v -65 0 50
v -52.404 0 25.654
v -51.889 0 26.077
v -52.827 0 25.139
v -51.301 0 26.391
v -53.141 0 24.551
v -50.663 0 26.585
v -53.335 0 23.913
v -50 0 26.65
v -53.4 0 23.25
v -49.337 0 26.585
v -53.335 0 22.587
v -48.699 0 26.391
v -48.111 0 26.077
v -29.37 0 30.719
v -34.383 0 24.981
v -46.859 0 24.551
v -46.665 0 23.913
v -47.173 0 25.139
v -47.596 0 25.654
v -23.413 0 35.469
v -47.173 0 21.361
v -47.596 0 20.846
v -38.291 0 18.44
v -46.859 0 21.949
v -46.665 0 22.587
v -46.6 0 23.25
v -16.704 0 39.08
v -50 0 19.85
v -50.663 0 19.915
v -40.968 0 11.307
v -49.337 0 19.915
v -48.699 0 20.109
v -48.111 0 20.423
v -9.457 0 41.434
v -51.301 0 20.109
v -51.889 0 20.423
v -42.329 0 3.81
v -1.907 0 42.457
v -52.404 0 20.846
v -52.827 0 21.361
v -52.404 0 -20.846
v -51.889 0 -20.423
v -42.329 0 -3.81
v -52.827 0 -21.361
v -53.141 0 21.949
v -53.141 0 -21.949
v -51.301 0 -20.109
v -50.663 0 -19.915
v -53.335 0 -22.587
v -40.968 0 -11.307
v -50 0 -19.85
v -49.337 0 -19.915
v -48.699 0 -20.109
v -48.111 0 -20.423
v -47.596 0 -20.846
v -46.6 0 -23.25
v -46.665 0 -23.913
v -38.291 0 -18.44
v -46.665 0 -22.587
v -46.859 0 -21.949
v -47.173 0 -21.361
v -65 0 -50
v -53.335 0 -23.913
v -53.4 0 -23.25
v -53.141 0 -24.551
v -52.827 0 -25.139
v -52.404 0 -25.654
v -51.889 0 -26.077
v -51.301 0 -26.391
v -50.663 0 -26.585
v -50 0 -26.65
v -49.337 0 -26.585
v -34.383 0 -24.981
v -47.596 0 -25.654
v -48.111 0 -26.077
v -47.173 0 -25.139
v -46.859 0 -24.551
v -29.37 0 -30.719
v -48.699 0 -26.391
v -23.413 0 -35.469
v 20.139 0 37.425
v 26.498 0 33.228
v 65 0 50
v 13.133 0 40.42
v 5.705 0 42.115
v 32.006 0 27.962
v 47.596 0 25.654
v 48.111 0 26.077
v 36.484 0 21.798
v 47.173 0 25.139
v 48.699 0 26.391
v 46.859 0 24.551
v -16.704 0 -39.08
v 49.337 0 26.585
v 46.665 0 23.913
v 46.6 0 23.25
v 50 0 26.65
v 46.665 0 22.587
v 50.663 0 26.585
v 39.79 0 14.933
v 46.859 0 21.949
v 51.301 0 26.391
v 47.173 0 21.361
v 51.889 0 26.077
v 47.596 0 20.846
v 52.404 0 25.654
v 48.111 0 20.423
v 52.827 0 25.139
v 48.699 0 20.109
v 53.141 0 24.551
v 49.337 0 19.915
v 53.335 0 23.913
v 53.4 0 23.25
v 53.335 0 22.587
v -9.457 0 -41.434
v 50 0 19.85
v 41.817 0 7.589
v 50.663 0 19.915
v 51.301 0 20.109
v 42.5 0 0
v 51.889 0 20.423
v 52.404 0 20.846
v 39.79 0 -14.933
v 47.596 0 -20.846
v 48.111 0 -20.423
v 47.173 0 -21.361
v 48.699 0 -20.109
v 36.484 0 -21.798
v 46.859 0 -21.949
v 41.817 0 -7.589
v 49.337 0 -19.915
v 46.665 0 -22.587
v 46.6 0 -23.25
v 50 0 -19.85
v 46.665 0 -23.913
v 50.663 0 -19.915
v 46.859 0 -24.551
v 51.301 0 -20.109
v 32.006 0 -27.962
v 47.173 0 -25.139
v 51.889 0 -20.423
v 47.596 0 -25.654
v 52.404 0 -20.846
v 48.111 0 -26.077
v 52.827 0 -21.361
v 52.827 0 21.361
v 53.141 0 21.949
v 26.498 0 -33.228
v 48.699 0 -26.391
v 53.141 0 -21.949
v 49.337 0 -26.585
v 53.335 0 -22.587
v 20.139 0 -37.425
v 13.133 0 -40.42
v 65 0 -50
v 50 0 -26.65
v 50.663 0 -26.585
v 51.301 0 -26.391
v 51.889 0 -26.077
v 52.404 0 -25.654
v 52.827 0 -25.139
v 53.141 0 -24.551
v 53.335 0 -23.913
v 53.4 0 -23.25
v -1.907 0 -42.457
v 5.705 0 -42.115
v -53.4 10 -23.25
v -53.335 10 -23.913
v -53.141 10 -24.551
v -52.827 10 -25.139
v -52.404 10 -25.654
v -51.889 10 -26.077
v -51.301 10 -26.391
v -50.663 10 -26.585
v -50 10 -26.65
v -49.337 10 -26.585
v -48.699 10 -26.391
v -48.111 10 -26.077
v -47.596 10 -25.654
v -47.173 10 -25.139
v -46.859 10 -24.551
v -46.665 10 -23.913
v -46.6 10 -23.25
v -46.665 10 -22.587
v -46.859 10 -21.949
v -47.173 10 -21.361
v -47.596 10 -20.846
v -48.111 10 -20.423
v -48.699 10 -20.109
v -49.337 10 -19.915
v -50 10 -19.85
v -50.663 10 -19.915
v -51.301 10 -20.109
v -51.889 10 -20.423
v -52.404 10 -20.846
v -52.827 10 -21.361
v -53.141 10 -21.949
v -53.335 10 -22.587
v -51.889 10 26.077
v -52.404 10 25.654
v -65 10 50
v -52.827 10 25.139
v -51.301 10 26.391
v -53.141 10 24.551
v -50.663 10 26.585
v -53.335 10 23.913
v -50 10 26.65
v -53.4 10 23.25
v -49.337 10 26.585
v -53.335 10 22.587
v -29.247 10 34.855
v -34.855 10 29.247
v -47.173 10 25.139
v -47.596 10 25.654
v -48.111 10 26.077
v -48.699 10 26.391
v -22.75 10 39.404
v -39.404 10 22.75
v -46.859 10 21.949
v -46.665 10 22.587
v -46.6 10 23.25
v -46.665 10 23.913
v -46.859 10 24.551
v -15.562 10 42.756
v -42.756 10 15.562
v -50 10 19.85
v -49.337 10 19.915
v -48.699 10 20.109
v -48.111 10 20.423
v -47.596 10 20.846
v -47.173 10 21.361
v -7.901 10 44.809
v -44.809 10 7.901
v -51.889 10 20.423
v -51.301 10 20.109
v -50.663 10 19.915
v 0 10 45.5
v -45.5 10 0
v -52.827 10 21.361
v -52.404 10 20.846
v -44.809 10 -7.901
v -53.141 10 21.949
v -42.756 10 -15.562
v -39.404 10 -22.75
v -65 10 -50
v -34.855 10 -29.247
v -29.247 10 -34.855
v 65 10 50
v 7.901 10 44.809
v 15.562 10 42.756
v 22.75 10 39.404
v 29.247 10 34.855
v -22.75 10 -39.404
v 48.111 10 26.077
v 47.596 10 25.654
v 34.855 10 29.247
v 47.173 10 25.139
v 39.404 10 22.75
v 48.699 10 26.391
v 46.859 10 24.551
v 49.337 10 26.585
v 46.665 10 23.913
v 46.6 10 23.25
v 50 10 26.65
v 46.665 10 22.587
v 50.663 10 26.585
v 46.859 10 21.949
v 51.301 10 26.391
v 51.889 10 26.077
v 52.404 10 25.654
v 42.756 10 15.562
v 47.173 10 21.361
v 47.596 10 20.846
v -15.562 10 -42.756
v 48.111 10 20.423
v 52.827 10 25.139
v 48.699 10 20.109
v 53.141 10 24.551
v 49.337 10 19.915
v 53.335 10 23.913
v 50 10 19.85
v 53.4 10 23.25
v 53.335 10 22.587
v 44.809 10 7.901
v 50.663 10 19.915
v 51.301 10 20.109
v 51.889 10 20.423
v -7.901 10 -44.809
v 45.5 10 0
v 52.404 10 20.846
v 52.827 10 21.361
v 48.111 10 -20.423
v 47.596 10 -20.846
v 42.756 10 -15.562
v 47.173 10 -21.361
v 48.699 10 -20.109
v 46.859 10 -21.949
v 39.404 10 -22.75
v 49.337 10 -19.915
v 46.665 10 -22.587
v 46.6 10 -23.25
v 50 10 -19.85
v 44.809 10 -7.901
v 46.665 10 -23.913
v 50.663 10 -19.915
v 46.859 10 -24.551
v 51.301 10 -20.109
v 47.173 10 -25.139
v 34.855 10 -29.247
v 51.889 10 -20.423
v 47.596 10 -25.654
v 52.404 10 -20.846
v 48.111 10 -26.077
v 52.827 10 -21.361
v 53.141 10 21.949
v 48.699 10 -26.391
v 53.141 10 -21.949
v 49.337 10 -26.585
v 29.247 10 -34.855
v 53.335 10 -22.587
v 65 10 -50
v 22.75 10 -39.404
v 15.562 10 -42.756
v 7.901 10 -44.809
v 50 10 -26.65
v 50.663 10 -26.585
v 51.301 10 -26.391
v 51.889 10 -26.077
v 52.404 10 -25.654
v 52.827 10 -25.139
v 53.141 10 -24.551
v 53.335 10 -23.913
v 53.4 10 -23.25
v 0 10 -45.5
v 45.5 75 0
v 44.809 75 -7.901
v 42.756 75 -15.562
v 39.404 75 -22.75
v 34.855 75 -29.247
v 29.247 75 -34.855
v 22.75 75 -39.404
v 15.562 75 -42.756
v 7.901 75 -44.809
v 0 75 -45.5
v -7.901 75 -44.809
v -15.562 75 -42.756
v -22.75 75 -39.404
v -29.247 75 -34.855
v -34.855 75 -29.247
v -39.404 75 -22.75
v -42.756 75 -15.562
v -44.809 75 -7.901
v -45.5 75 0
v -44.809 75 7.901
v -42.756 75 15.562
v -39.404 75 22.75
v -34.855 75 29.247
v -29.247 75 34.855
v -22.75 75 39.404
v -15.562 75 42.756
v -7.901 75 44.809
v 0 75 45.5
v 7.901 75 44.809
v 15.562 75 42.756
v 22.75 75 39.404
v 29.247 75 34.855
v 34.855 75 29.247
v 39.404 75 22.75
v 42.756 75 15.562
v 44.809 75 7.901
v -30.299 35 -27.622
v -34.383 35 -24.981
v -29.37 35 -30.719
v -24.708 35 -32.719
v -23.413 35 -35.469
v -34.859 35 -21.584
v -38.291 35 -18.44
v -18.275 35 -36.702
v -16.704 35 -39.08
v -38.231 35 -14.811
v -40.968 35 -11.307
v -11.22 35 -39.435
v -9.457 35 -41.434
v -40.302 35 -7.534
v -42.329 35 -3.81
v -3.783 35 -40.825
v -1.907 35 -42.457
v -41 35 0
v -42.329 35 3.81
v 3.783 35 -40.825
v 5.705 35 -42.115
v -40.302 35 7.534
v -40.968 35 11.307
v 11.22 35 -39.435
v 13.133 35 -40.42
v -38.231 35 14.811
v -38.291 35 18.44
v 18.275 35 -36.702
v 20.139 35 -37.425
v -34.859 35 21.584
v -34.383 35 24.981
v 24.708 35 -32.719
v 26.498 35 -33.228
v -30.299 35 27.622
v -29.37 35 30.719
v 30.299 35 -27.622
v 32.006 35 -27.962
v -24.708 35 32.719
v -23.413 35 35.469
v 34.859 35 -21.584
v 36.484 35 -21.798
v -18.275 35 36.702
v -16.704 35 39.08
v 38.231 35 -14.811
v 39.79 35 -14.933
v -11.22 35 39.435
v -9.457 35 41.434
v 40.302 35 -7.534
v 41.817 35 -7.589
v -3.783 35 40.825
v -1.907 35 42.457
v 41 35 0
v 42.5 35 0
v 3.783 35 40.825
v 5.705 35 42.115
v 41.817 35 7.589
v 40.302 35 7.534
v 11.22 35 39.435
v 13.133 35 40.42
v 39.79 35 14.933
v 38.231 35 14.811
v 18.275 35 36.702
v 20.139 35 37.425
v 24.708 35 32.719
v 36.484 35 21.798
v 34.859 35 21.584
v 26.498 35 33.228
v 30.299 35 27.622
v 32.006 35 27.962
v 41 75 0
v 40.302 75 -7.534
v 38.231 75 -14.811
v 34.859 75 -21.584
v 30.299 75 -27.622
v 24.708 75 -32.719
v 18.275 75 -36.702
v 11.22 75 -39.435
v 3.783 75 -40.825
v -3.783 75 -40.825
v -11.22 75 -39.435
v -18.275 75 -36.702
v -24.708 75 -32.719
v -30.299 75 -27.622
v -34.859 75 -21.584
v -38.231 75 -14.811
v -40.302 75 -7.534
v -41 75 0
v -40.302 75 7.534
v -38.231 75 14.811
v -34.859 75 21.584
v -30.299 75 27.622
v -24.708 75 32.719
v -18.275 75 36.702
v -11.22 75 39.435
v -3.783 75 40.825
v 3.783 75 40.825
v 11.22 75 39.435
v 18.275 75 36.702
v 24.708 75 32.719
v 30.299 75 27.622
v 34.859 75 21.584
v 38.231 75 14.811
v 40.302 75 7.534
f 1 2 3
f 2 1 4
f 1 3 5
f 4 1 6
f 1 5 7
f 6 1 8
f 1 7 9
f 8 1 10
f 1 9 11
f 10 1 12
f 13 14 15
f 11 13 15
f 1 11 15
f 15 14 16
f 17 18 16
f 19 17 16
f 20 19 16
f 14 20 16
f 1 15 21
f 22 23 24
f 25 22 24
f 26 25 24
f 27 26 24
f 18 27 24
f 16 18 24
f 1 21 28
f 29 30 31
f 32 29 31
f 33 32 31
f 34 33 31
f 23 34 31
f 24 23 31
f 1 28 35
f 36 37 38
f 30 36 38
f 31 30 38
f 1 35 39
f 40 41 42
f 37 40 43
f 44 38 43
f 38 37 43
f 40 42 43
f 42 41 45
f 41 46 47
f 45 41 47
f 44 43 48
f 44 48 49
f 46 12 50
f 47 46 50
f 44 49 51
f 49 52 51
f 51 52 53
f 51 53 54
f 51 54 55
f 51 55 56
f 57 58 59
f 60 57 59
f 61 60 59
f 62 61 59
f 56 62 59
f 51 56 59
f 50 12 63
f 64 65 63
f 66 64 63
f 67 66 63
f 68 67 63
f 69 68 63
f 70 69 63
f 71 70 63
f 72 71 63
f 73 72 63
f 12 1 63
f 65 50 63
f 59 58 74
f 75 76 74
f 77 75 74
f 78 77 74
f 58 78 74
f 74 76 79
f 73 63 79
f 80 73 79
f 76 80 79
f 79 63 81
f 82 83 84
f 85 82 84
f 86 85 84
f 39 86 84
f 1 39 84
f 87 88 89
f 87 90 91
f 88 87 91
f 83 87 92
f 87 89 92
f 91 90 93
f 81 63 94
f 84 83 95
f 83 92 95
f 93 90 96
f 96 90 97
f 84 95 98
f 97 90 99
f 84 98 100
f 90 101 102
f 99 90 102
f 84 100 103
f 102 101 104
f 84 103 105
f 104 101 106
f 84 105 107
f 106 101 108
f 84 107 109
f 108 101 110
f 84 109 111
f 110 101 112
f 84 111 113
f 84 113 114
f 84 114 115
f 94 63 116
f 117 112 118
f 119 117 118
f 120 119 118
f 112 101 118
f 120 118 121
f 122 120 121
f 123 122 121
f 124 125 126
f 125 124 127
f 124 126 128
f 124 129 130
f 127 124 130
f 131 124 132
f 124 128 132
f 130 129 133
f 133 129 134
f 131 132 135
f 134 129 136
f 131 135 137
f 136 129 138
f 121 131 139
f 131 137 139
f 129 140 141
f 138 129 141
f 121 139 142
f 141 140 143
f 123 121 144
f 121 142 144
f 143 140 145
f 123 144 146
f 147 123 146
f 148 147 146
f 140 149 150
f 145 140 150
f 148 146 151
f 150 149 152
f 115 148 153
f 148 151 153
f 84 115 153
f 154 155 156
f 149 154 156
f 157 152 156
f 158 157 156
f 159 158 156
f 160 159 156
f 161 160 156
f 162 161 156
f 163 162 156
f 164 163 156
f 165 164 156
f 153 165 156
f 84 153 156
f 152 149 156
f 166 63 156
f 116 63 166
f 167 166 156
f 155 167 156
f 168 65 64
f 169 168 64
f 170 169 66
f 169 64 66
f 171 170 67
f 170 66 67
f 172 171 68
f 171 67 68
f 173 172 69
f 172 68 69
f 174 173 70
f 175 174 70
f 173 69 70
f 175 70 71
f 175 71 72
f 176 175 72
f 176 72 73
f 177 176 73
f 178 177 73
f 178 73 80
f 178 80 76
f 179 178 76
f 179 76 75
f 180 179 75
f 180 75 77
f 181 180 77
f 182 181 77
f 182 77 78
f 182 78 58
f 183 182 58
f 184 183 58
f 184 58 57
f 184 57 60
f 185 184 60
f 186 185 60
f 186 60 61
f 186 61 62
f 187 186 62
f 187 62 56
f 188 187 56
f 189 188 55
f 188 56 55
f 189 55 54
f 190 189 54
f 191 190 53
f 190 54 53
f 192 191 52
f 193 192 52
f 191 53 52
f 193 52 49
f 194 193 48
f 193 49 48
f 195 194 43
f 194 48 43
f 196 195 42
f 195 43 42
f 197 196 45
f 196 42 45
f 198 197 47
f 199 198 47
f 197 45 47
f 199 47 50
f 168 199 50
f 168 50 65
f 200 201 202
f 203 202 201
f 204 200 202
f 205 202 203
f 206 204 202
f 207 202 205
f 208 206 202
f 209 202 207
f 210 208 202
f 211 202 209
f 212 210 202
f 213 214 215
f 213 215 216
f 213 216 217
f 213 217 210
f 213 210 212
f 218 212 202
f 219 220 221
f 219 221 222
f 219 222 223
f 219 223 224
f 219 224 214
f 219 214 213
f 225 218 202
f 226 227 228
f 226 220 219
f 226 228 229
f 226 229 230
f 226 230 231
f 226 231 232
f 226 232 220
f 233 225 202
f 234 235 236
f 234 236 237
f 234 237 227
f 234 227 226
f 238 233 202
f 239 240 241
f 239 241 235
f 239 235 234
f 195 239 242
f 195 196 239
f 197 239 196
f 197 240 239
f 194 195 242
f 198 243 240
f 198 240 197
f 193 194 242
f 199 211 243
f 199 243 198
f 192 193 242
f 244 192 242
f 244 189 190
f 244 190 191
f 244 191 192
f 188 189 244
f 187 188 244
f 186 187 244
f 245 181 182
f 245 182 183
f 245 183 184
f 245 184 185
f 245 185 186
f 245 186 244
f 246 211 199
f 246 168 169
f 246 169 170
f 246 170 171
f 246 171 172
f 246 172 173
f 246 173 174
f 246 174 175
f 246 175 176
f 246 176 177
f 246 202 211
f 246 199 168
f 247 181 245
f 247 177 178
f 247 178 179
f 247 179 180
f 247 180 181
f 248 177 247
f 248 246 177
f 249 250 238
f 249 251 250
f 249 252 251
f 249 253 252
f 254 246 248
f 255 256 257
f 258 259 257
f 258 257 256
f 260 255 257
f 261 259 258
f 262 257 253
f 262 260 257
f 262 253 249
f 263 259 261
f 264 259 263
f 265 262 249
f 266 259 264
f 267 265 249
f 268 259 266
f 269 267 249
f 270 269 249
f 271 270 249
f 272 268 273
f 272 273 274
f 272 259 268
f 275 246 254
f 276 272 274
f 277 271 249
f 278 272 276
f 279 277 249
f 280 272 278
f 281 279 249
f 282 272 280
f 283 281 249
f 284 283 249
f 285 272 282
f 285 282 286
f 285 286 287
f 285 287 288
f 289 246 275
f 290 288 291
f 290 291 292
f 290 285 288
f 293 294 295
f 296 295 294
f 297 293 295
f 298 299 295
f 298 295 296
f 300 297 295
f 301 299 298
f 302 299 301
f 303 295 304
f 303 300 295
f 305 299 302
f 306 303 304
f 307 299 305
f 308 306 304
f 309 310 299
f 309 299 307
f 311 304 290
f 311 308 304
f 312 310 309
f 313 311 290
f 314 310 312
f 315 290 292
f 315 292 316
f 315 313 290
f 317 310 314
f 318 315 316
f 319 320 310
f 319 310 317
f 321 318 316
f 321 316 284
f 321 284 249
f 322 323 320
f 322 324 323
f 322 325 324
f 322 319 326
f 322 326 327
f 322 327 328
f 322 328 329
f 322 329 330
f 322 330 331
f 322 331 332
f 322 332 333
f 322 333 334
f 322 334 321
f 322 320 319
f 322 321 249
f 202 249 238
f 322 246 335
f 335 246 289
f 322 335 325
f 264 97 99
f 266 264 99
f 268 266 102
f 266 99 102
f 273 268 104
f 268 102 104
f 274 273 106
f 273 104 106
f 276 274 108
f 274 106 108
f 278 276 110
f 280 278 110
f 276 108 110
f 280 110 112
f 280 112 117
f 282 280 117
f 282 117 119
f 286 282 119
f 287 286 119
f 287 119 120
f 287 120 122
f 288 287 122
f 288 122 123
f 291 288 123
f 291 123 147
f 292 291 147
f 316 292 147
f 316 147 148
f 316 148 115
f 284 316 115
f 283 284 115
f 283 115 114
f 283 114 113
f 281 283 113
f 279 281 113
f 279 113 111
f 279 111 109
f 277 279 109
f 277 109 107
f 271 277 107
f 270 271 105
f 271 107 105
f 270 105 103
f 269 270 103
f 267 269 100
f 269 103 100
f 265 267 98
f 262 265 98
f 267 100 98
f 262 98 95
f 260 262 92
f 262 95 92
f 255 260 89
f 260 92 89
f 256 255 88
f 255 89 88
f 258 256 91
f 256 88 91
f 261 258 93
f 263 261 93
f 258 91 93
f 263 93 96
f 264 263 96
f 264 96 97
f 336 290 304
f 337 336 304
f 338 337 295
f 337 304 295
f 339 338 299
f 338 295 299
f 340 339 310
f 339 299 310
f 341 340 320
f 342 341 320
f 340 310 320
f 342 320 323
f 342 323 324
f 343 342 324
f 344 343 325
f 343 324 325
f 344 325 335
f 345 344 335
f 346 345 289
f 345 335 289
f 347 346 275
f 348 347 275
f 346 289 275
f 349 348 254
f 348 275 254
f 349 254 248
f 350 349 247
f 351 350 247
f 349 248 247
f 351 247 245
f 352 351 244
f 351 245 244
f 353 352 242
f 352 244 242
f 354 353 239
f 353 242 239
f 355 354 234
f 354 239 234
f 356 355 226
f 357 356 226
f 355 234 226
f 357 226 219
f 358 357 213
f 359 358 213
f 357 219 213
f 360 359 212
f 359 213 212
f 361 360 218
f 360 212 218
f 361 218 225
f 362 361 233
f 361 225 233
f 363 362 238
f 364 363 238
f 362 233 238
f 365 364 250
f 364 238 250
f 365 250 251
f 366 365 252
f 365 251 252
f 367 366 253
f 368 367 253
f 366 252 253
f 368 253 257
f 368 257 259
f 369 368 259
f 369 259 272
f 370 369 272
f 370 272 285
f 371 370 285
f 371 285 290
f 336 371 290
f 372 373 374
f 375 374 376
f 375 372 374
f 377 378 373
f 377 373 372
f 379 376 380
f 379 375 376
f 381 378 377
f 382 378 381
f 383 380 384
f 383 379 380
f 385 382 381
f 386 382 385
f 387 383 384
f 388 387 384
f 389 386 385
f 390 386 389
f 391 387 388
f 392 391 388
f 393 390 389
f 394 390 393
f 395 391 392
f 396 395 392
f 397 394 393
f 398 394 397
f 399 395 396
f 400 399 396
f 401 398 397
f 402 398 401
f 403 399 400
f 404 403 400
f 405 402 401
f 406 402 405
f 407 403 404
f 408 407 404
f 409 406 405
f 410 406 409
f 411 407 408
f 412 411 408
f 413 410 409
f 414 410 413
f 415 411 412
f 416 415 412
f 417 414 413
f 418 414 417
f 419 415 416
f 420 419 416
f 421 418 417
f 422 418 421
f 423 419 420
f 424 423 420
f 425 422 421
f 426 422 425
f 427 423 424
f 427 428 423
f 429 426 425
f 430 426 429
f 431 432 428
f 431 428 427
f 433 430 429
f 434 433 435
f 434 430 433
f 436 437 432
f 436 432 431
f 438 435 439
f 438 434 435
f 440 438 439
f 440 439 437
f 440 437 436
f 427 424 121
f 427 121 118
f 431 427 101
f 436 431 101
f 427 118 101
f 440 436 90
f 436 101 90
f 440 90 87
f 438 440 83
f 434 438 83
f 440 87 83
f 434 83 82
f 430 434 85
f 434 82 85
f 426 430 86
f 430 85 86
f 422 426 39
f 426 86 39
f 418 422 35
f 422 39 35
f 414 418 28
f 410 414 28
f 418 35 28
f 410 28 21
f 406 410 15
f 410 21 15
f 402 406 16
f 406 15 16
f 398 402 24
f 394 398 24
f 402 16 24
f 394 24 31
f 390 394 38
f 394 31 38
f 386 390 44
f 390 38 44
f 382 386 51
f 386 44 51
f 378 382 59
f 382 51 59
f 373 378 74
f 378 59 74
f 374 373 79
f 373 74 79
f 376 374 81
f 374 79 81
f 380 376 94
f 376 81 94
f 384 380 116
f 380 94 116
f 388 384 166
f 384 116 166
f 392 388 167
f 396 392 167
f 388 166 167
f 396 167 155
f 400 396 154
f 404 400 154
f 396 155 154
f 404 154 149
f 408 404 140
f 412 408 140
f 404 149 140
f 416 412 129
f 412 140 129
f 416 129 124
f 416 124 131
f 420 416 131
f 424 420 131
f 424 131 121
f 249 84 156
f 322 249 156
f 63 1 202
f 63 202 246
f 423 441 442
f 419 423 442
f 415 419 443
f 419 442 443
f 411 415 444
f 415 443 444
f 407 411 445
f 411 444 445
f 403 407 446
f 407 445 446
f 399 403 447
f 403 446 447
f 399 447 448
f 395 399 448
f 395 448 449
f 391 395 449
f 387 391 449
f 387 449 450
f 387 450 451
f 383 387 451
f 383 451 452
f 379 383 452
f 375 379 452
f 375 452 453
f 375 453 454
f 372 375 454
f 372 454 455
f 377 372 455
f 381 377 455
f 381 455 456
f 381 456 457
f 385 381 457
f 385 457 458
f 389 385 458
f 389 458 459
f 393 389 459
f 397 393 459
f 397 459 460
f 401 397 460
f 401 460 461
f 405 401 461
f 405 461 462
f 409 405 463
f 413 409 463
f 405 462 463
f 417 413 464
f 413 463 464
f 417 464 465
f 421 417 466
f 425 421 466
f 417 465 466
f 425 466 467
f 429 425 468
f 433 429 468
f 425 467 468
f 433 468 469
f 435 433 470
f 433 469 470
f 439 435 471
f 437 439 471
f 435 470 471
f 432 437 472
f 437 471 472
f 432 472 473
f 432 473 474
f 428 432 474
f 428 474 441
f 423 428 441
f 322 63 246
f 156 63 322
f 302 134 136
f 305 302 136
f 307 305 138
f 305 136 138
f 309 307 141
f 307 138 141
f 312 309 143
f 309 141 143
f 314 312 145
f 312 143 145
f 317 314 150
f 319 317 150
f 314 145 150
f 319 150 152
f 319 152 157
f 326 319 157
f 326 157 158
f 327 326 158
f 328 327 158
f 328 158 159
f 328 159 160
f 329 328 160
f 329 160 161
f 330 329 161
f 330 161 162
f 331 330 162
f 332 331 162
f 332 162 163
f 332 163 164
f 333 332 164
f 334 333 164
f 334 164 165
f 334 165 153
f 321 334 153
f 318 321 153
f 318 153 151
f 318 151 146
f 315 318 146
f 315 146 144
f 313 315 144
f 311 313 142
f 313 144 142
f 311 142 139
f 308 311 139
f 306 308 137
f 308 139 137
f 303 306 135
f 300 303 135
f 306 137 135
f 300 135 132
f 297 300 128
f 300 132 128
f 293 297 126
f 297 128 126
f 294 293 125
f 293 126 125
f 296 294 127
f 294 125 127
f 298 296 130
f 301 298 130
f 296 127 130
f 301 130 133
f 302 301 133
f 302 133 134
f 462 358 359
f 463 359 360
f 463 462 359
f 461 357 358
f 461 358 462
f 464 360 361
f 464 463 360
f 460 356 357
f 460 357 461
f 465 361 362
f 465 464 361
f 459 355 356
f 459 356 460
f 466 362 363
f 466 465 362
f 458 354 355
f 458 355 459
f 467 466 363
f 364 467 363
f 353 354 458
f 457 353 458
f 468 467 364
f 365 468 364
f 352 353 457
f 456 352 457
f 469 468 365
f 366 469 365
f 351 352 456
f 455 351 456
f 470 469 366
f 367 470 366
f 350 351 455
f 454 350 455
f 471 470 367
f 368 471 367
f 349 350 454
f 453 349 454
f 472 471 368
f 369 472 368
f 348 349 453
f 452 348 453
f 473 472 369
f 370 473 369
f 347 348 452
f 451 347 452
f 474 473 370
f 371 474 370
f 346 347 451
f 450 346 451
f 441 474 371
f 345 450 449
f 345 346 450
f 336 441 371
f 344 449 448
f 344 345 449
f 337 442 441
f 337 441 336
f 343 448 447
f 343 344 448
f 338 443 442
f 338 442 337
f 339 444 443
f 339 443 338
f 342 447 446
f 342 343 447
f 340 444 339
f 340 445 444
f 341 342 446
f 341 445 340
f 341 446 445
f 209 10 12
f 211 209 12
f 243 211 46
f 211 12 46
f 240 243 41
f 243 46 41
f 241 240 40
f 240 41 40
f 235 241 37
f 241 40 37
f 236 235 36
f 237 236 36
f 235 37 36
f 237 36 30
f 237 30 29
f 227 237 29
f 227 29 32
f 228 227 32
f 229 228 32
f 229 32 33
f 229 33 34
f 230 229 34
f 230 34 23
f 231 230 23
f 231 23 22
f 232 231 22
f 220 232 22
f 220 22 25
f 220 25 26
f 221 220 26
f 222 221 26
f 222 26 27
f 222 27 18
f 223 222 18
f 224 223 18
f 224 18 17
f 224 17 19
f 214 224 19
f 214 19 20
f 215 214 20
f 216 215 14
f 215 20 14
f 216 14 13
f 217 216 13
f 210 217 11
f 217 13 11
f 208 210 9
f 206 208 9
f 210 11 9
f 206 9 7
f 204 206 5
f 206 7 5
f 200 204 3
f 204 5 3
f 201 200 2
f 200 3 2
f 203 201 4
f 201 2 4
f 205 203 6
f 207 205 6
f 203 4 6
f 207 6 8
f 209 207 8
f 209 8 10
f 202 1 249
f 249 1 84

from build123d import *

# Parameters (mm, degrees)
SKETCH1_W             = 130
SKETCH1_H             = 100
BOSS_EXTRUDE1_DEPTH   = 10
SKETCH2_R             = 45.5
BOSS_EXTRUDE2_DEPTH   = 65
SKETCH3_R             = 41
CUT_EXTRUDE1_DEPTH    = 76
SKETCH4_R             = 42.5
CUT_EXTRUDE2_DEPTH    = 35
M8_TAPPED_HOLE1_D     = 6.8
M8_TAPPED_HOLE1_DEPTH = 17.707073895
M8_TAPPED_HOLE1_TIP   = 2.042926105


with BuildPart() as part:
    # Sketch1 → Boss-Extrude1 (new body)
    with BuildSketch(Plane(origin=(0, 0, 0), x_dir=(1, 0, 0), z_dir=(0, 1, 0))):
        Rectangle(SKETCH1_W, SKETCH1_H)
    extrude(amount=BOSS_EXTRUDE1_DEPTH)

    # Sketch2 → Boss-Extrude2 (add)
    with BuildSketch(Plane(origin=(0, 10, 0), x_dir=(1, 0, 0), z_dir=(0, 1, 0))):
        Circle(SKETCH2_R)
    extrude(amount=BOSS_EXTRUDE2_DEPTH)

    # Sketch3 → Cut-Extrude1 (cut, through all)
    with BuildSketch(Plane(origin=(0, 75, 0), x_dir=(1, 0, 0), z_dir=(0, 1, 0))):
        Circle(SKETCH3_R)
    extrude(amount=-CUT_EXTRUDE1_DEPTH, mode=Mode.SUBTRACT)

    # Sketch4 → Cut-Extrude2 (cut)
    with BuildSketch(Plane.XZ):
        Circle(SKETCH4_R)
    extrude(amount=-CUT_EXTRUDE2_DEPTH, mode=Mode.SUBTRACT)

    # M8 Tapped Hole1
    with Locations(Plane(origin=(0, 10, 0), x_dir=(1, 0, 0), z_dir=(0, 1, 0))):
        with Locations((-50, 23.25), (-50, -23.25), (50, -23.25), (50, 23.25)):
            Hole(M8_TAPPED_HOLE1_D / 2, depth=M8_TAPPED_HOLE1_DEPTH)
            with Locations((0, 0, -(M8_TAPPED_HOLE1_DEPTH + M8_TAPPED_HOLE1_TIP / 2))):  # 118° drill point
                Cone(0, M8_TAPPED_HOLE1_D / 2, M8_TAPPED_HOLE1_TIP, mode=Mode.SUBTRACT)


solid = part.part
